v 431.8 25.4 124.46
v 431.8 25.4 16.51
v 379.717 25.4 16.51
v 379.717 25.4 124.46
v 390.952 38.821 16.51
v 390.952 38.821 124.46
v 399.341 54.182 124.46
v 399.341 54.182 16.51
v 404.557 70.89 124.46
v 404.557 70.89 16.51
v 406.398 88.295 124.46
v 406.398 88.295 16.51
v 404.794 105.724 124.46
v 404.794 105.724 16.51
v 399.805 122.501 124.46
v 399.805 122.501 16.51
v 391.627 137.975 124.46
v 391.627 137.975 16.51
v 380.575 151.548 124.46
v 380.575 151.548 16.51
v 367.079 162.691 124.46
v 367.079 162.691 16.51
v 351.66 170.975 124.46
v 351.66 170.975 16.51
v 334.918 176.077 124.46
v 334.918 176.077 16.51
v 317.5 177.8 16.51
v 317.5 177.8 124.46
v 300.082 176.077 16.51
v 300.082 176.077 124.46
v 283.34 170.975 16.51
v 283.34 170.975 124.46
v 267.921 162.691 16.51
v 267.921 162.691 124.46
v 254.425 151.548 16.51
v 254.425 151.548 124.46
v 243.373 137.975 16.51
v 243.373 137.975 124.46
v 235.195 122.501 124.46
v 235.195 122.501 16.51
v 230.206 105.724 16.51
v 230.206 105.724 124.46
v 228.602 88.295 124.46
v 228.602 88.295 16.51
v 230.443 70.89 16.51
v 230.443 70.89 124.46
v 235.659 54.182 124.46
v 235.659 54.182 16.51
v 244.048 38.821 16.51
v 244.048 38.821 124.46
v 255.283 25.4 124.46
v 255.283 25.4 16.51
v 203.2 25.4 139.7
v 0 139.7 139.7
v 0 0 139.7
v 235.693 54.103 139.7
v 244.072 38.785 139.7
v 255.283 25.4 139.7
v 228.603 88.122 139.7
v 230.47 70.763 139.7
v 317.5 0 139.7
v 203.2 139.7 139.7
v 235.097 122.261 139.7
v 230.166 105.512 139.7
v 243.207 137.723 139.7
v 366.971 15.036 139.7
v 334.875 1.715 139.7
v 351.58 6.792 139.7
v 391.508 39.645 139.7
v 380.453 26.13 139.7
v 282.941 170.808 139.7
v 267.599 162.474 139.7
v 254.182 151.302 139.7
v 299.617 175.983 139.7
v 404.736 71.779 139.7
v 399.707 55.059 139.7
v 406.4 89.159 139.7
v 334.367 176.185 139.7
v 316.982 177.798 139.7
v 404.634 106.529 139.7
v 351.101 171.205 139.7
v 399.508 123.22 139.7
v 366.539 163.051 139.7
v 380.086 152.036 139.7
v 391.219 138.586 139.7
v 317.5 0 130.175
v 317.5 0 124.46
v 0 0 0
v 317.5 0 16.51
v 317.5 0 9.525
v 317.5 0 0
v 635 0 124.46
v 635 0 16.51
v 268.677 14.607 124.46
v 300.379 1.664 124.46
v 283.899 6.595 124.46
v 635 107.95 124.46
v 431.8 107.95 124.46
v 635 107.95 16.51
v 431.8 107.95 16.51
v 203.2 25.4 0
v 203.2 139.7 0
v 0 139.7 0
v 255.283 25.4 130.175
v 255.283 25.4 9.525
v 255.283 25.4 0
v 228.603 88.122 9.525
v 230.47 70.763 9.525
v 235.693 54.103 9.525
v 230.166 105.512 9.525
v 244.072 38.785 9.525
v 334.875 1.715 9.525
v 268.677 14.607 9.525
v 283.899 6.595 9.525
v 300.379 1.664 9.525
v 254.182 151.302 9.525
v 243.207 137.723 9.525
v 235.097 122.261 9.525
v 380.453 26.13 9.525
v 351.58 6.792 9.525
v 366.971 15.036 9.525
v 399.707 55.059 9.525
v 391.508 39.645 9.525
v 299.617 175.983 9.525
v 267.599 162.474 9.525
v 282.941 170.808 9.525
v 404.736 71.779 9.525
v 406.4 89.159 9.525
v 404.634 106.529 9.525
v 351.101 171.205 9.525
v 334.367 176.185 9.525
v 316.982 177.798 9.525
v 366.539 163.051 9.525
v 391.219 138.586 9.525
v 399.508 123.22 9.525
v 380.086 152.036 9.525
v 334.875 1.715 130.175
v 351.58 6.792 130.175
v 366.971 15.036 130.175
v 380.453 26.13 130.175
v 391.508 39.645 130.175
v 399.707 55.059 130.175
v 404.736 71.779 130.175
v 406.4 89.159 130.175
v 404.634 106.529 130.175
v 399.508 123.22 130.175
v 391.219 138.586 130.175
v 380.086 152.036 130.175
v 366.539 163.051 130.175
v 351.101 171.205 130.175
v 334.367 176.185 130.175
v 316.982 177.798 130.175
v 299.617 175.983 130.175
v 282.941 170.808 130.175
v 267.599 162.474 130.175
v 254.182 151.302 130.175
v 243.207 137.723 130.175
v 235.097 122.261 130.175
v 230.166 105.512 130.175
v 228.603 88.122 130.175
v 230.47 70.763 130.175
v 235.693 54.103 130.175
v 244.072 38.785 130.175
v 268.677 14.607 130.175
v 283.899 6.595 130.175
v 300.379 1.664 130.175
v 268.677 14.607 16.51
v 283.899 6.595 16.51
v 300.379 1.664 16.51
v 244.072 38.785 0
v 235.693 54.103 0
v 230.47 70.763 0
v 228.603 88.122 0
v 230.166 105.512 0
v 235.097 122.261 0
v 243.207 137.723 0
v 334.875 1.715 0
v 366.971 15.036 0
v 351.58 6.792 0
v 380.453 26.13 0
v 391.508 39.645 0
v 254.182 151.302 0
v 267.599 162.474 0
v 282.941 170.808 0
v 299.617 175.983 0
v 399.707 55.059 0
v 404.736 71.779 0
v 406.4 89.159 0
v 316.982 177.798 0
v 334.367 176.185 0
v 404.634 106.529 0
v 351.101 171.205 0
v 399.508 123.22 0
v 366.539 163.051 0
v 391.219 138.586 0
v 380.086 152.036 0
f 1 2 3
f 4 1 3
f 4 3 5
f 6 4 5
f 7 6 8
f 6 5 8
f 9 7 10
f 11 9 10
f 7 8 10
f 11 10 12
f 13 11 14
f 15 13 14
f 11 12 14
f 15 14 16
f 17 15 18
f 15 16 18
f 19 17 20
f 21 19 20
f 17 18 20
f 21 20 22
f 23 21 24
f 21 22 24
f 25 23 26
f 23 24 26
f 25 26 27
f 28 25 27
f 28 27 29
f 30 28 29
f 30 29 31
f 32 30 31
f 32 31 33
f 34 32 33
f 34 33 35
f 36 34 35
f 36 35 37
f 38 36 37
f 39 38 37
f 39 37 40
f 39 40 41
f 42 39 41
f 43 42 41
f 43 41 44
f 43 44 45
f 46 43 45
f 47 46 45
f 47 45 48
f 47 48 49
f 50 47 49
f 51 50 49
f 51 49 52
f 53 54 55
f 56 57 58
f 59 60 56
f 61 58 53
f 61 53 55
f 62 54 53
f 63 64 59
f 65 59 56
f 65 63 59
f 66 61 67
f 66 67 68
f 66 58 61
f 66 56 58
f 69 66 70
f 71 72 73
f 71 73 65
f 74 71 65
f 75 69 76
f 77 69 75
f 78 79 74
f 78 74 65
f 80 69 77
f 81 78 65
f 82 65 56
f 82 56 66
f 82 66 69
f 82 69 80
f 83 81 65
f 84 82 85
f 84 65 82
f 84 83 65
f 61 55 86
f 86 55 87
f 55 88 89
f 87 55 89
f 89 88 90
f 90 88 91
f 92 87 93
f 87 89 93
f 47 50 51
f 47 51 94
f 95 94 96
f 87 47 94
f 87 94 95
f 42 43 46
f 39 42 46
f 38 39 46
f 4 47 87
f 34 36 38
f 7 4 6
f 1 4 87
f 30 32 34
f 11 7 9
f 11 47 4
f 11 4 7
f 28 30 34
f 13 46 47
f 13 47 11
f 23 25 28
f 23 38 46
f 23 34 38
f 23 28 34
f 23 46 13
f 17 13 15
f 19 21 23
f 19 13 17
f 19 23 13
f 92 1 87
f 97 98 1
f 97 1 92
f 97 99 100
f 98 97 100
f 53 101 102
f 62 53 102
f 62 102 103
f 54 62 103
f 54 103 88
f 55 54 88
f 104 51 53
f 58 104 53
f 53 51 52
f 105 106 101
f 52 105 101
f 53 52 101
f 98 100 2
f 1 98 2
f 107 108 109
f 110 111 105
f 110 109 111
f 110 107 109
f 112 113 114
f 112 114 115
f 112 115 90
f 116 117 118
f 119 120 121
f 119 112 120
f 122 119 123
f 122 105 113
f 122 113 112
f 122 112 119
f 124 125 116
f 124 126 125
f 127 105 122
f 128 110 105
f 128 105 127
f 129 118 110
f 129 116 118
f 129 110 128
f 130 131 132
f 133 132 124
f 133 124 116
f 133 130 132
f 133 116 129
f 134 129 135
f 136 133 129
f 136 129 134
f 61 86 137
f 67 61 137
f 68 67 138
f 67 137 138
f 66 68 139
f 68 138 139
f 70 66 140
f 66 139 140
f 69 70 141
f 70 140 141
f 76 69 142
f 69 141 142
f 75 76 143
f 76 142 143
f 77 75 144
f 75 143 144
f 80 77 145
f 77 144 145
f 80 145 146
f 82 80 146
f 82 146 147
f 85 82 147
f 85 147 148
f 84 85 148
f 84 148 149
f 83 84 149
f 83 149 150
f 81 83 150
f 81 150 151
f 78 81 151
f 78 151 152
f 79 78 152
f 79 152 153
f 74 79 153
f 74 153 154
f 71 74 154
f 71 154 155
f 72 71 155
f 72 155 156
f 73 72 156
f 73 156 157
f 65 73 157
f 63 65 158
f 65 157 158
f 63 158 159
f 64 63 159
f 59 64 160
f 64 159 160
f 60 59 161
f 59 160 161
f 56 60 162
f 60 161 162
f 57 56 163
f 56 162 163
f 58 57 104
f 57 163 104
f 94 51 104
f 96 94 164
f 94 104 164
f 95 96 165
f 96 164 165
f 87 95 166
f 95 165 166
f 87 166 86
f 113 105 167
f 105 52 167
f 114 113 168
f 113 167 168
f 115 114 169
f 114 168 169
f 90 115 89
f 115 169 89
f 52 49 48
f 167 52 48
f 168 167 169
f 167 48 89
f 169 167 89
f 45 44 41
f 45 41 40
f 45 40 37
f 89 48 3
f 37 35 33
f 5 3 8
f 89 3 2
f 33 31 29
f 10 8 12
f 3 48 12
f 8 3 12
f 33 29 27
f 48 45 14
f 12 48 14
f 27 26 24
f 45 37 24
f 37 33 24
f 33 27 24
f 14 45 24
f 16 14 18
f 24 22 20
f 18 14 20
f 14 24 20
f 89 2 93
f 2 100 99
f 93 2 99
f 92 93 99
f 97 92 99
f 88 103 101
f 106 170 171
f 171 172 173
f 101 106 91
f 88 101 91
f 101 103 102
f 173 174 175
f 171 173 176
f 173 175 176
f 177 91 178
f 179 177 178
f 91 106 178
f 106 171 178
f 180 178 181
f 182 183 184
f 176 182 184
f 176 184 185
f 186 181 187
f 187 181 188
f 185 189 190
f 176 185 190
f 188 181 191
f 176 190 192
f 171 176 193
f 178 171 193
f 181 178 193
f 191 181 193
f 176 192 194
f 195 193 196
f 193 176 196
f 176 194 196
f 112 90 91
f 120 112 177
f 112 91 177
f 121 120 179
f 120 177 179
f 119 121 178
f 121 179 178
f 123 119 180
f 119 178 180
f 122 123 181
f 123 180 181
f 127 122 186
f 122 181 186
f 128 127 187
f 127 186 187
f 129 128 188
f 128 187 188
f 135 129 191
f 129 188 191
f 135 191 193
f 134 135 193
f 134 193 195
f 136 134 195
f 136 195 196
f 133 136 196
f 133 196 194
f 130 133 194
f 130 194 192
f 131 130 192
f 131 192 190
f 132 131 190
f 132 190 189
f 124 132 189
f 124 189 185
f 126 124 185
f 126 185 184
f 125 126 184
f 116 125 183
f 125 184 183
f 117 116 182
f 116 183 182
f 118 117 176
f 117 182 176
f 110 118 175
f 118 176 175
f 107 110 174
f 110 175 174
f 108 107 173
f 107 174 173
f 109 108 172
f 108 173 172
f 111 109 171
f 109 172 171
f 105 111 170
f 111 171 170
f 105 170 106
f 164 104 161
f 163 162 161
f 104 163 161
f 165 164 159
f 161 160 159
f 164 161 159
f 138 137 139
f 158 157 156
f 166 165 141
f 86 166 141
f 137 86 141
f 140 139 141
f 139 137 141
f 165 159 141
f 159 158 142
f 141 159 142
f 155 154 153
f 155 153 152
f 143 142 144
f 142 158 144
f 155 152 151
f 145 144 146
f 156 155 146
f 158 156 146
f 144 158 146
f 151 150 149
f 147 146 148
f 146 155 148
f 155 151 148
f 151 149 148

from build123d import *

# Parameters (mm, degrees)
BOSS_EXTRUDE1_DEPTH     = 139.7
SKETCH3_R               = 88.9
CUT_EXTRUDE1_DEPTH      = 60.325
CUT_EXTRUDE1_DEPTH_BACK = 60.325
BOSS_EXTRUDE2_START     = 16.51
BOSS_EXTRUDE2_DEPTH     = 107.95


with BuildPart() as part:
    # Sketch1 → Boss-Extrude1 (new body)
    with BuildSketch(Plane.XY):
        with BuildLine():
            Line((203.2, 0), (317.5, 0))
            ThreePointArc((317.5, 0), (351.101041651, 171.20540687), (255.282960533, 25.4))
            Line((255.282960533, 25.4), (203.2, 25.4))
            Line((203.2, 25.4), (203.2, 139.7))
            Line((203.2, 139.7), (0, 139.7))
            Line((0, 139.7), (0, 0))
            Line((0, 0), (203.2, 0))
        make_face()
    extrude(amount=BOSS_EXTRUDE1_DEPTH)

    # Sketch3 → Cut-Extrude1 (cut, two sides)
    with BuildSketch(Plane.XY.offset(69.85)) as cut_extrude1_sk:
        with Locations((317.5, 88.9)):
            Circle(SKETCH3_R)
    extrude(amount=CUT_EXTRUDE1_DEPTH, mode=Mode.SUBTRACT)
    extrude(cut_extrude1_sk.sketch, amount=-CUT_EXTRUDE1_DEPTH_BACK, mode=Mode.SUBTRACT)

    # Sketch2 → Boss-Extrude2 (add)
    with BuildSketch(Plane.XY.offset(BOSS_EXTRUDE2_START)):
        with BuildLine():
            Line((317.5, 0), (431.8, 0))
            Line((431.8, 0), (635, 0))
            Line((635, 0), (635, 107.95))
            Line((635, 107.95), (431.8, 107.95))
            Line((431.8, 107.95), (431.8, 25.4))
            Line((431.8, 25.4), (379.717039467, 25.4))
            ThreePointArc((379.717039467, 25.4), (283.898958349, 171.20540687), (317.5, 0))
        make_face()
    extrude(amount=BOSS_EXTRUDE2_DEPTH)


solid = part.part
